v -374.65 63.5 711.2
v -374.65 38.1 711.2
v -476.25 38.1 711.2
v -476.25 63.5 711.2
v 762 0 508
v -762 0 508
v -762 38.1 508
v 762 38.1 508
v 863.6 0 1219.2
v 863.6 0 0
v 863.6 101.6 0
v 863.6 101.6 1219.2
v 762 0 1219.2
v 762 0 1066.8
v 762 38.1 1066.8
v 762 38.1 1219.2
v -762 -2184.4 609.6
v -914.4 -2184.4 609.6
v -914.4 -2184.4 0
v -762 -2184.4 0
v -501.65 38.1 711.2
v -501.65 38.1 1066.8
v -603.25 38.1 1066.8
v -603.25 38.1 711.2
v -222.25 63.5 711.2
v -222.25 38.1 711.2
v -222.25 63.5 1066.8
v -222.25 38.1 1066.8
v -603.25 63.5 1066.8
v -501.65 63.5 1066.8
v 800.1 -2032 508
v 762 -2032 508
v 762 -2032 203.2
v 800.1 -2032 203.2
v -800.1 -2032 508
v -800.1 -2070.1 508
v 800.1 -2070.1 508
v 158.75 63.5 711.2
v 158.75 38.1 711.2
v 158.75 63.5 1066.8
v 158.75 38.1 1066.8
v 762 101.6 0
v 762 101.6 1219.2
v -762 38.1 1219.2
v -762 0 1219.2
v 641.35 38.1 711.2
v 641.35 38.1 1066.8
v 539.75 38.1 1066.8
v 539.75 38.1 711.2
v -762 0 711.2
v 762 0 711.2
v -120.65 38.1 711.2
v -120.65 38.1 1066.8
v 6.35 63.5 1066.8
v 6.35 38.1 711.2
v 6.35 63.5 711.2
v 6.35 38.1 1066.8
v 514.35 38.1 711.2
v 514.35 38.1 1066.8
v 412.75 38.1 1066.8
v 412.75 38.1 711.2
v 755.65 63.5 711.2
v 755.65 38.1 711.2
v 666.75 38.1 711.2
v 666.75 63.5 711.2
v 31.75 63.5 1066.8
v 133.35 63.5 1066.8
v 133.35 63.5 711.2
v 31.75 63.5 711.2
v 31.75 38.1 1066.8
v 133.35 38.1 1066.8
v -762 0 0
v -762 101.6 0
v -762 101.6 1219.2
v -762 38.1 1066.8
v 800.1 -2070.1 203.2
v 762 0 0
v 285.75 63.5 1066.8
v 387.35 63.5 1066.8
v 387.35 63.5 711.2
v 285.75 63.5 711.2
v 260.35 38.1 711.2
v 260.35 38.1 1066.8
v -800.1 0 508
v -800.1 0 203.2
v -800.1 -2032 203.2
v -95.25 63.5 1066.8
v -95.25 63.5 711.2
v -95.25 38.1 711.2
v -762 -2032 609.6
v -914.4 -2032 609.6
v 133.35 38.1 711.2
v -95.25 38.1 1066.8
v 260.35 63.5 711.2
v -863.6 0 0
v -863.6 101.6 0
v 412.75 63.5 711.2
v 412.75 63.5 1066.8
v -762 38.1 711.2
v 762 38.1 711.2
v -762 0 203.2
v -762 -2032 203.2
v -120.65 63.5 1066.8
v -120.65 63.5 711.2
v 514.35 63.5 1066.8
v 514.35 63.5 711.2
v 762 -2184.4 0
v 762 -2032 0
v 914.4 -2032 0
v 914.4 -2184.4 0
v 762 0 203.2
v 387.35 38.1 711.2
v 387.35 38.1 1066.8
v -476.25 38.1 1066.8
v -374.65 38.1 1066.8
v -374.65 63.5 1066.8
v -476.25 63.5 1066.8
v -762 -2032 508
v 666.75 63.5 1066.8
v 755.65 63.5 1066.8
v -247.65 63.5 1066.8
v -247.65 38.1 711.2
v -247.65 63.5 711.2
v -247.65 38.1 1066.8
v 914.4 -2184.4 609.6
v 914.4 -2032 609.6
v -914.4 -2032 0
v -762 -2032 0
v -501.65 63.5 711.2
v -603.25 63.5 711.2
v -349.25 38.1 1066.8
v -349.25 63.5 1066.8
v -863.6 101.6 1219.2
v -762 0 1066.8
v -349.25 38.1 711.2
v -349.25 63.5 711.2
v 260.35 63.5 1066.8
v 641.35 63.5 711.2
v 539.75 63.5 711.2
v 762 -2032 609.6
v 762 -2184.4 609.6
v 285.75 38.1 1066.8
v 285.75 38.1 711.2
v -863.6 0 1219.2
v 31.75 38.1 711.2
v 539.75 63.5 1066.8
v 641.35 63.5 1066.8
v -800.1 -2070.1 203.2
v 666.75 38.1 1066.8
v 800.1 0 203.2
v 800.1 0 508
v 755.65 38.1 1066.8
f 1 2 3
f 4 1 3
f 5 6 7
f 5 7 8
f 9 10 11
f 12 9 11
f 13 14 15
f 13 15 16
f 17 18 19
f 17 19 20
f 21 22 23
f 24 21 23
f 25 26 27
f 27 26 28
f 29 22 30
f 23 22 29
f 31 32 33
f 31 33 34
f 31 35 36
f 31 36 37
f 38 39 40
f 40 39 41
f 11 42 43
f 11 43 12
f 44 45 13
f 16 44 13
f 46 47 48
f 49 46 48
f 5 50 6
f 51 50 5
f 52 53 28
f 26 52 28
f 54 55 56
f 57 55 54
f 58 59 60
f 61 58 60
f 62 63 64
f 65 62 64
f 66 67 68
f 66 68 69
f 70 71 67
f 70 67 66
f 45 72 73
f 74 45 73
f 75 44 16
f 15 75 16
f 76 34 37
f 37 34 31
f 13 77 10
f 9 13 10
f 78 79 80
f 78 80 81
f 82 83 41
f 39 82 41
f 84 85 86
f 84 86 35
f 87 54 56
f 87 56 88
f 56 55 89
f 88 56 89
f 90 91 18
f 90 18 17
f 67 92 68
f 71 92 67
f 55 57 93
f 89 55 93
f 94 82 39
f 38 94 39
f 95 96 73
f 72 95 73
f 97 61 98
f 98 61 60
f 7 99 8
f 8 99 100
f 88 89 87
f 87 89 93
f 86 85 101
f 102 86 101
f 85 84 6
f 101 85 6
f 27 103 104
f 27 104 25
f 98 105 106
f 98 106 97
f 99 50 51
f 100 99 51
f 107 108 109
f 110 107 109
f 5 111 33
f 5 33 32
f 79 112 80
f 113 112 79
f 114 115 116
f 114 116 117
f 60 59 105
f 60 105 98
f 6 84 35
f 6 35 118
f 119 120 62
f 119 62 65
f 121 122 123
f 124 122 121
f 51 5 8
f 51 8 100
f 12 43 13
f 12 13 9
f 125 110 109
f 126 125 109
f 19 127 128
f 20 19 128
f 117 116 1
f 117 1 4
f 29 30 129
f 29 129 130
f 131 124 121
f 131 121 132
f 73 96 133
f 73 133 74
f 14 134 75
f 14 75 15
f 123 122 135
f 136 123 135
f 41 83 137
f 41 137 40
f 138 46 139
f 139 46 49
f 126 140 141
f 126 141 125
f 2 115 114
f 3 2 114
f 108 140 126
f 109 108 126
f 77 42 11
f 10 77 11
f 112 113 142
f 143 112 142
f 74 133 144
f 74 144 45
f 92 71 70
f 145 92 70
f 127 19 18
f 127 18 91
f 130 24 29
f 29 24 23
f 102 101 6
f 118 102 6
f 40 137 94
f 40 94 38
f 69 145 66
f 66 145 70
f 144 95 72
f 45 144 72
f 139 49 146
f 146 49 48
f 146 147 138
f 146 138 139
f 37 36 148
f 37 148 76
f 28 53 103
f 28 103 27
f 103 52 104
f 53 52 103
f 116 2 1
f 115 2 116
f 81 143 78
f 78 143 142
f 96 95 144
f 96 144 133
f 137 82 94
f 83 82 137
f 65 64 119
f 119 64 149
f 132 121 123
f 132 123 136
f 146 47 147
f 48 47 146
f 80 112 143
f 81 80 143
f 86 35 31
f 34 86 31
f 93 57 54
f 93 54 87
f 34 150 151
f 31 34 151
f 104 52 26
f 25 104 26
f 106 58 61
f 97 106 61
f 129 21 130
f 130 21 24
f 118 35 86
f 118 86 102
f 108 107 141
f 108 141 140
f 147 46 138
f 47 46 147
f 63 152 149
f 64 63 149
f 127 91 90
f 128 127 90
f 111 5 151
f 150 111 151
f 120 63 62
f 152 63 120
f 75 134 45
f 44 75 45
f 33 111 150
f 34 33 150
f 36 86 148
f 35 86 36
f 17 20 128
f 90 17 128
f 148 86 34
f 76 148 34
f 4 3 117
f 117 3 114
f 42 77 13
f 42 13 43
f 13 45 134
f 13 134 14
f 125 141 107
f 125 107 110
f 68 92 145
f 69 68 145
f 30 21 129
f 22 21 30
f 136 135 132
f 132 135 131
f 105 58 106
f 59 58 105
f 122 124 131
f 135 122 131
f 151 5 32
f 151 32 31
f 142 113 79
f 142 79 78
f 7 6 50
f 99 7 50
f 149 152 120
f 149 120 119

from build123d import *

# Parameters (mm, degrees)
F0_W      = 101.6
F0_H      = 101.6
F1_DEPTH  = 1219.2
F2_W      = 1524
F2_H      = 152.4
F2_H_2    = 203.2
F3_DEPTH  = 38.1
F4_W      = 88.9
F4_H      = 355.6
F4_W_2    = 101.6
F5_DEPTH  = 25.4
F6_W      = 38.1
F6_H      = 304.8
F7_DEPTH  = 2032
F8_W      = 1600.2
F8_H      = 304.8
F9_DEPTH  = 38.1
F10_W     = 152.4
F10_H     = 152.4
F11_DEPTH = 609.6


with BuildPart() as f1:
    # F0 (on Top) → F1 (new body)
    with BuildSketch(Plane.XY):
        with Locations((-812.8, 50.8)):
            Rectangle(F0_W, F0_H)
        with Locations((812.8, 50.8)):
            Rectangle(F0_W, F0_H)
    extrude(amount=F1_DEPTH)


with BuildPart() as f3:
    # F2 (on face) → F3 (new body)
    with BuildSketch(Plane.XZ):
        with Locations((0, 1143)):
            Rectangle(F2_W, F2_H)
        with Locations((0, 609.6)):
            Rectangle(F2_W, F2_H_2)
    extrude(amount=-F3_DEPTH)


with BuildPart() as f5:
    # F4 (on face) → F5 (new body)
    with BuildSketch(Plane(origin=(0, 38.1, 0), x_dir=(-1, 0, 0), z_dir=(0, 1, 0))):
        with Locations((-711.2, 889)):
            Rectangle(F4_W, F4_H)
        with Locations((-590.55, 889)):
            Rectangle(F4_W_2, F4_H)
        with Locations((-463.55, 889)):
            Rectangle(F4_W_2, F4_H)
        with Locations((-336.55, 889)):
            Rectangle(F4_W_2, F4_H)
        with Locations((-209.55, 889)):
            Rectangle(F4_W_2, F4_H)
        with Locations((-82.55, 889)):
            Rectangle(F4_W_2, F4_H)
        with Locations((44.45, 889)):
            Rectangle(F4_W_2, F4_H)
        with Locations((171.45, 889)):
            Rectangle(F4_W_2, F4_H)
        with Locations((298.45, 889)):
            Rectangle(F4_W_2, F4_H)
        with Locations((425.45, 889)):
            Rectangle(F4_W_2, F4_H)
        with Locations((552.45, 889)):
            Rectangle(F4_W_2, F4_H)
    extrude(amount=F5_DEPTH)


with BuildPart() as f7:
    # F6 (on face) → F7 (new body)
    with BuildSketch(Plane.XZ):
        with Locations((-781.05, 355.6)):
            Rectangle(F6_W, F6_H)
        with Locations((781.05, 355.6)):
            Rectangle(F6_W, F6_H)
    extrude(amount=F7_DEPTH)


with BuildPart() as f9:
    # F8 (on face) → F9 (new body)
    with BuildSketch(Plane.XZ.offset(2032)):
        with Locations((0, 355.6)):
            Rectangle(F8_W, F8_H)
    extrude(amount=F9_DEPTH)


with BuildPart() as f11:
    # F10 (on Top) → F11 (new body)
    with BuildSketch(Plane.XY):
        with Locations((-838.2, -2108.2)):
            Rectangle(F10_W, F10_H)
        with Locations((838.2, -2108.2)):
            Rectangle(F10_W, F10_H)
    extrude(amount=F11_DEPTH)


solid = Compound([f1.part, f3.part, f5.part, f7.part, f9.part, f11.part])
